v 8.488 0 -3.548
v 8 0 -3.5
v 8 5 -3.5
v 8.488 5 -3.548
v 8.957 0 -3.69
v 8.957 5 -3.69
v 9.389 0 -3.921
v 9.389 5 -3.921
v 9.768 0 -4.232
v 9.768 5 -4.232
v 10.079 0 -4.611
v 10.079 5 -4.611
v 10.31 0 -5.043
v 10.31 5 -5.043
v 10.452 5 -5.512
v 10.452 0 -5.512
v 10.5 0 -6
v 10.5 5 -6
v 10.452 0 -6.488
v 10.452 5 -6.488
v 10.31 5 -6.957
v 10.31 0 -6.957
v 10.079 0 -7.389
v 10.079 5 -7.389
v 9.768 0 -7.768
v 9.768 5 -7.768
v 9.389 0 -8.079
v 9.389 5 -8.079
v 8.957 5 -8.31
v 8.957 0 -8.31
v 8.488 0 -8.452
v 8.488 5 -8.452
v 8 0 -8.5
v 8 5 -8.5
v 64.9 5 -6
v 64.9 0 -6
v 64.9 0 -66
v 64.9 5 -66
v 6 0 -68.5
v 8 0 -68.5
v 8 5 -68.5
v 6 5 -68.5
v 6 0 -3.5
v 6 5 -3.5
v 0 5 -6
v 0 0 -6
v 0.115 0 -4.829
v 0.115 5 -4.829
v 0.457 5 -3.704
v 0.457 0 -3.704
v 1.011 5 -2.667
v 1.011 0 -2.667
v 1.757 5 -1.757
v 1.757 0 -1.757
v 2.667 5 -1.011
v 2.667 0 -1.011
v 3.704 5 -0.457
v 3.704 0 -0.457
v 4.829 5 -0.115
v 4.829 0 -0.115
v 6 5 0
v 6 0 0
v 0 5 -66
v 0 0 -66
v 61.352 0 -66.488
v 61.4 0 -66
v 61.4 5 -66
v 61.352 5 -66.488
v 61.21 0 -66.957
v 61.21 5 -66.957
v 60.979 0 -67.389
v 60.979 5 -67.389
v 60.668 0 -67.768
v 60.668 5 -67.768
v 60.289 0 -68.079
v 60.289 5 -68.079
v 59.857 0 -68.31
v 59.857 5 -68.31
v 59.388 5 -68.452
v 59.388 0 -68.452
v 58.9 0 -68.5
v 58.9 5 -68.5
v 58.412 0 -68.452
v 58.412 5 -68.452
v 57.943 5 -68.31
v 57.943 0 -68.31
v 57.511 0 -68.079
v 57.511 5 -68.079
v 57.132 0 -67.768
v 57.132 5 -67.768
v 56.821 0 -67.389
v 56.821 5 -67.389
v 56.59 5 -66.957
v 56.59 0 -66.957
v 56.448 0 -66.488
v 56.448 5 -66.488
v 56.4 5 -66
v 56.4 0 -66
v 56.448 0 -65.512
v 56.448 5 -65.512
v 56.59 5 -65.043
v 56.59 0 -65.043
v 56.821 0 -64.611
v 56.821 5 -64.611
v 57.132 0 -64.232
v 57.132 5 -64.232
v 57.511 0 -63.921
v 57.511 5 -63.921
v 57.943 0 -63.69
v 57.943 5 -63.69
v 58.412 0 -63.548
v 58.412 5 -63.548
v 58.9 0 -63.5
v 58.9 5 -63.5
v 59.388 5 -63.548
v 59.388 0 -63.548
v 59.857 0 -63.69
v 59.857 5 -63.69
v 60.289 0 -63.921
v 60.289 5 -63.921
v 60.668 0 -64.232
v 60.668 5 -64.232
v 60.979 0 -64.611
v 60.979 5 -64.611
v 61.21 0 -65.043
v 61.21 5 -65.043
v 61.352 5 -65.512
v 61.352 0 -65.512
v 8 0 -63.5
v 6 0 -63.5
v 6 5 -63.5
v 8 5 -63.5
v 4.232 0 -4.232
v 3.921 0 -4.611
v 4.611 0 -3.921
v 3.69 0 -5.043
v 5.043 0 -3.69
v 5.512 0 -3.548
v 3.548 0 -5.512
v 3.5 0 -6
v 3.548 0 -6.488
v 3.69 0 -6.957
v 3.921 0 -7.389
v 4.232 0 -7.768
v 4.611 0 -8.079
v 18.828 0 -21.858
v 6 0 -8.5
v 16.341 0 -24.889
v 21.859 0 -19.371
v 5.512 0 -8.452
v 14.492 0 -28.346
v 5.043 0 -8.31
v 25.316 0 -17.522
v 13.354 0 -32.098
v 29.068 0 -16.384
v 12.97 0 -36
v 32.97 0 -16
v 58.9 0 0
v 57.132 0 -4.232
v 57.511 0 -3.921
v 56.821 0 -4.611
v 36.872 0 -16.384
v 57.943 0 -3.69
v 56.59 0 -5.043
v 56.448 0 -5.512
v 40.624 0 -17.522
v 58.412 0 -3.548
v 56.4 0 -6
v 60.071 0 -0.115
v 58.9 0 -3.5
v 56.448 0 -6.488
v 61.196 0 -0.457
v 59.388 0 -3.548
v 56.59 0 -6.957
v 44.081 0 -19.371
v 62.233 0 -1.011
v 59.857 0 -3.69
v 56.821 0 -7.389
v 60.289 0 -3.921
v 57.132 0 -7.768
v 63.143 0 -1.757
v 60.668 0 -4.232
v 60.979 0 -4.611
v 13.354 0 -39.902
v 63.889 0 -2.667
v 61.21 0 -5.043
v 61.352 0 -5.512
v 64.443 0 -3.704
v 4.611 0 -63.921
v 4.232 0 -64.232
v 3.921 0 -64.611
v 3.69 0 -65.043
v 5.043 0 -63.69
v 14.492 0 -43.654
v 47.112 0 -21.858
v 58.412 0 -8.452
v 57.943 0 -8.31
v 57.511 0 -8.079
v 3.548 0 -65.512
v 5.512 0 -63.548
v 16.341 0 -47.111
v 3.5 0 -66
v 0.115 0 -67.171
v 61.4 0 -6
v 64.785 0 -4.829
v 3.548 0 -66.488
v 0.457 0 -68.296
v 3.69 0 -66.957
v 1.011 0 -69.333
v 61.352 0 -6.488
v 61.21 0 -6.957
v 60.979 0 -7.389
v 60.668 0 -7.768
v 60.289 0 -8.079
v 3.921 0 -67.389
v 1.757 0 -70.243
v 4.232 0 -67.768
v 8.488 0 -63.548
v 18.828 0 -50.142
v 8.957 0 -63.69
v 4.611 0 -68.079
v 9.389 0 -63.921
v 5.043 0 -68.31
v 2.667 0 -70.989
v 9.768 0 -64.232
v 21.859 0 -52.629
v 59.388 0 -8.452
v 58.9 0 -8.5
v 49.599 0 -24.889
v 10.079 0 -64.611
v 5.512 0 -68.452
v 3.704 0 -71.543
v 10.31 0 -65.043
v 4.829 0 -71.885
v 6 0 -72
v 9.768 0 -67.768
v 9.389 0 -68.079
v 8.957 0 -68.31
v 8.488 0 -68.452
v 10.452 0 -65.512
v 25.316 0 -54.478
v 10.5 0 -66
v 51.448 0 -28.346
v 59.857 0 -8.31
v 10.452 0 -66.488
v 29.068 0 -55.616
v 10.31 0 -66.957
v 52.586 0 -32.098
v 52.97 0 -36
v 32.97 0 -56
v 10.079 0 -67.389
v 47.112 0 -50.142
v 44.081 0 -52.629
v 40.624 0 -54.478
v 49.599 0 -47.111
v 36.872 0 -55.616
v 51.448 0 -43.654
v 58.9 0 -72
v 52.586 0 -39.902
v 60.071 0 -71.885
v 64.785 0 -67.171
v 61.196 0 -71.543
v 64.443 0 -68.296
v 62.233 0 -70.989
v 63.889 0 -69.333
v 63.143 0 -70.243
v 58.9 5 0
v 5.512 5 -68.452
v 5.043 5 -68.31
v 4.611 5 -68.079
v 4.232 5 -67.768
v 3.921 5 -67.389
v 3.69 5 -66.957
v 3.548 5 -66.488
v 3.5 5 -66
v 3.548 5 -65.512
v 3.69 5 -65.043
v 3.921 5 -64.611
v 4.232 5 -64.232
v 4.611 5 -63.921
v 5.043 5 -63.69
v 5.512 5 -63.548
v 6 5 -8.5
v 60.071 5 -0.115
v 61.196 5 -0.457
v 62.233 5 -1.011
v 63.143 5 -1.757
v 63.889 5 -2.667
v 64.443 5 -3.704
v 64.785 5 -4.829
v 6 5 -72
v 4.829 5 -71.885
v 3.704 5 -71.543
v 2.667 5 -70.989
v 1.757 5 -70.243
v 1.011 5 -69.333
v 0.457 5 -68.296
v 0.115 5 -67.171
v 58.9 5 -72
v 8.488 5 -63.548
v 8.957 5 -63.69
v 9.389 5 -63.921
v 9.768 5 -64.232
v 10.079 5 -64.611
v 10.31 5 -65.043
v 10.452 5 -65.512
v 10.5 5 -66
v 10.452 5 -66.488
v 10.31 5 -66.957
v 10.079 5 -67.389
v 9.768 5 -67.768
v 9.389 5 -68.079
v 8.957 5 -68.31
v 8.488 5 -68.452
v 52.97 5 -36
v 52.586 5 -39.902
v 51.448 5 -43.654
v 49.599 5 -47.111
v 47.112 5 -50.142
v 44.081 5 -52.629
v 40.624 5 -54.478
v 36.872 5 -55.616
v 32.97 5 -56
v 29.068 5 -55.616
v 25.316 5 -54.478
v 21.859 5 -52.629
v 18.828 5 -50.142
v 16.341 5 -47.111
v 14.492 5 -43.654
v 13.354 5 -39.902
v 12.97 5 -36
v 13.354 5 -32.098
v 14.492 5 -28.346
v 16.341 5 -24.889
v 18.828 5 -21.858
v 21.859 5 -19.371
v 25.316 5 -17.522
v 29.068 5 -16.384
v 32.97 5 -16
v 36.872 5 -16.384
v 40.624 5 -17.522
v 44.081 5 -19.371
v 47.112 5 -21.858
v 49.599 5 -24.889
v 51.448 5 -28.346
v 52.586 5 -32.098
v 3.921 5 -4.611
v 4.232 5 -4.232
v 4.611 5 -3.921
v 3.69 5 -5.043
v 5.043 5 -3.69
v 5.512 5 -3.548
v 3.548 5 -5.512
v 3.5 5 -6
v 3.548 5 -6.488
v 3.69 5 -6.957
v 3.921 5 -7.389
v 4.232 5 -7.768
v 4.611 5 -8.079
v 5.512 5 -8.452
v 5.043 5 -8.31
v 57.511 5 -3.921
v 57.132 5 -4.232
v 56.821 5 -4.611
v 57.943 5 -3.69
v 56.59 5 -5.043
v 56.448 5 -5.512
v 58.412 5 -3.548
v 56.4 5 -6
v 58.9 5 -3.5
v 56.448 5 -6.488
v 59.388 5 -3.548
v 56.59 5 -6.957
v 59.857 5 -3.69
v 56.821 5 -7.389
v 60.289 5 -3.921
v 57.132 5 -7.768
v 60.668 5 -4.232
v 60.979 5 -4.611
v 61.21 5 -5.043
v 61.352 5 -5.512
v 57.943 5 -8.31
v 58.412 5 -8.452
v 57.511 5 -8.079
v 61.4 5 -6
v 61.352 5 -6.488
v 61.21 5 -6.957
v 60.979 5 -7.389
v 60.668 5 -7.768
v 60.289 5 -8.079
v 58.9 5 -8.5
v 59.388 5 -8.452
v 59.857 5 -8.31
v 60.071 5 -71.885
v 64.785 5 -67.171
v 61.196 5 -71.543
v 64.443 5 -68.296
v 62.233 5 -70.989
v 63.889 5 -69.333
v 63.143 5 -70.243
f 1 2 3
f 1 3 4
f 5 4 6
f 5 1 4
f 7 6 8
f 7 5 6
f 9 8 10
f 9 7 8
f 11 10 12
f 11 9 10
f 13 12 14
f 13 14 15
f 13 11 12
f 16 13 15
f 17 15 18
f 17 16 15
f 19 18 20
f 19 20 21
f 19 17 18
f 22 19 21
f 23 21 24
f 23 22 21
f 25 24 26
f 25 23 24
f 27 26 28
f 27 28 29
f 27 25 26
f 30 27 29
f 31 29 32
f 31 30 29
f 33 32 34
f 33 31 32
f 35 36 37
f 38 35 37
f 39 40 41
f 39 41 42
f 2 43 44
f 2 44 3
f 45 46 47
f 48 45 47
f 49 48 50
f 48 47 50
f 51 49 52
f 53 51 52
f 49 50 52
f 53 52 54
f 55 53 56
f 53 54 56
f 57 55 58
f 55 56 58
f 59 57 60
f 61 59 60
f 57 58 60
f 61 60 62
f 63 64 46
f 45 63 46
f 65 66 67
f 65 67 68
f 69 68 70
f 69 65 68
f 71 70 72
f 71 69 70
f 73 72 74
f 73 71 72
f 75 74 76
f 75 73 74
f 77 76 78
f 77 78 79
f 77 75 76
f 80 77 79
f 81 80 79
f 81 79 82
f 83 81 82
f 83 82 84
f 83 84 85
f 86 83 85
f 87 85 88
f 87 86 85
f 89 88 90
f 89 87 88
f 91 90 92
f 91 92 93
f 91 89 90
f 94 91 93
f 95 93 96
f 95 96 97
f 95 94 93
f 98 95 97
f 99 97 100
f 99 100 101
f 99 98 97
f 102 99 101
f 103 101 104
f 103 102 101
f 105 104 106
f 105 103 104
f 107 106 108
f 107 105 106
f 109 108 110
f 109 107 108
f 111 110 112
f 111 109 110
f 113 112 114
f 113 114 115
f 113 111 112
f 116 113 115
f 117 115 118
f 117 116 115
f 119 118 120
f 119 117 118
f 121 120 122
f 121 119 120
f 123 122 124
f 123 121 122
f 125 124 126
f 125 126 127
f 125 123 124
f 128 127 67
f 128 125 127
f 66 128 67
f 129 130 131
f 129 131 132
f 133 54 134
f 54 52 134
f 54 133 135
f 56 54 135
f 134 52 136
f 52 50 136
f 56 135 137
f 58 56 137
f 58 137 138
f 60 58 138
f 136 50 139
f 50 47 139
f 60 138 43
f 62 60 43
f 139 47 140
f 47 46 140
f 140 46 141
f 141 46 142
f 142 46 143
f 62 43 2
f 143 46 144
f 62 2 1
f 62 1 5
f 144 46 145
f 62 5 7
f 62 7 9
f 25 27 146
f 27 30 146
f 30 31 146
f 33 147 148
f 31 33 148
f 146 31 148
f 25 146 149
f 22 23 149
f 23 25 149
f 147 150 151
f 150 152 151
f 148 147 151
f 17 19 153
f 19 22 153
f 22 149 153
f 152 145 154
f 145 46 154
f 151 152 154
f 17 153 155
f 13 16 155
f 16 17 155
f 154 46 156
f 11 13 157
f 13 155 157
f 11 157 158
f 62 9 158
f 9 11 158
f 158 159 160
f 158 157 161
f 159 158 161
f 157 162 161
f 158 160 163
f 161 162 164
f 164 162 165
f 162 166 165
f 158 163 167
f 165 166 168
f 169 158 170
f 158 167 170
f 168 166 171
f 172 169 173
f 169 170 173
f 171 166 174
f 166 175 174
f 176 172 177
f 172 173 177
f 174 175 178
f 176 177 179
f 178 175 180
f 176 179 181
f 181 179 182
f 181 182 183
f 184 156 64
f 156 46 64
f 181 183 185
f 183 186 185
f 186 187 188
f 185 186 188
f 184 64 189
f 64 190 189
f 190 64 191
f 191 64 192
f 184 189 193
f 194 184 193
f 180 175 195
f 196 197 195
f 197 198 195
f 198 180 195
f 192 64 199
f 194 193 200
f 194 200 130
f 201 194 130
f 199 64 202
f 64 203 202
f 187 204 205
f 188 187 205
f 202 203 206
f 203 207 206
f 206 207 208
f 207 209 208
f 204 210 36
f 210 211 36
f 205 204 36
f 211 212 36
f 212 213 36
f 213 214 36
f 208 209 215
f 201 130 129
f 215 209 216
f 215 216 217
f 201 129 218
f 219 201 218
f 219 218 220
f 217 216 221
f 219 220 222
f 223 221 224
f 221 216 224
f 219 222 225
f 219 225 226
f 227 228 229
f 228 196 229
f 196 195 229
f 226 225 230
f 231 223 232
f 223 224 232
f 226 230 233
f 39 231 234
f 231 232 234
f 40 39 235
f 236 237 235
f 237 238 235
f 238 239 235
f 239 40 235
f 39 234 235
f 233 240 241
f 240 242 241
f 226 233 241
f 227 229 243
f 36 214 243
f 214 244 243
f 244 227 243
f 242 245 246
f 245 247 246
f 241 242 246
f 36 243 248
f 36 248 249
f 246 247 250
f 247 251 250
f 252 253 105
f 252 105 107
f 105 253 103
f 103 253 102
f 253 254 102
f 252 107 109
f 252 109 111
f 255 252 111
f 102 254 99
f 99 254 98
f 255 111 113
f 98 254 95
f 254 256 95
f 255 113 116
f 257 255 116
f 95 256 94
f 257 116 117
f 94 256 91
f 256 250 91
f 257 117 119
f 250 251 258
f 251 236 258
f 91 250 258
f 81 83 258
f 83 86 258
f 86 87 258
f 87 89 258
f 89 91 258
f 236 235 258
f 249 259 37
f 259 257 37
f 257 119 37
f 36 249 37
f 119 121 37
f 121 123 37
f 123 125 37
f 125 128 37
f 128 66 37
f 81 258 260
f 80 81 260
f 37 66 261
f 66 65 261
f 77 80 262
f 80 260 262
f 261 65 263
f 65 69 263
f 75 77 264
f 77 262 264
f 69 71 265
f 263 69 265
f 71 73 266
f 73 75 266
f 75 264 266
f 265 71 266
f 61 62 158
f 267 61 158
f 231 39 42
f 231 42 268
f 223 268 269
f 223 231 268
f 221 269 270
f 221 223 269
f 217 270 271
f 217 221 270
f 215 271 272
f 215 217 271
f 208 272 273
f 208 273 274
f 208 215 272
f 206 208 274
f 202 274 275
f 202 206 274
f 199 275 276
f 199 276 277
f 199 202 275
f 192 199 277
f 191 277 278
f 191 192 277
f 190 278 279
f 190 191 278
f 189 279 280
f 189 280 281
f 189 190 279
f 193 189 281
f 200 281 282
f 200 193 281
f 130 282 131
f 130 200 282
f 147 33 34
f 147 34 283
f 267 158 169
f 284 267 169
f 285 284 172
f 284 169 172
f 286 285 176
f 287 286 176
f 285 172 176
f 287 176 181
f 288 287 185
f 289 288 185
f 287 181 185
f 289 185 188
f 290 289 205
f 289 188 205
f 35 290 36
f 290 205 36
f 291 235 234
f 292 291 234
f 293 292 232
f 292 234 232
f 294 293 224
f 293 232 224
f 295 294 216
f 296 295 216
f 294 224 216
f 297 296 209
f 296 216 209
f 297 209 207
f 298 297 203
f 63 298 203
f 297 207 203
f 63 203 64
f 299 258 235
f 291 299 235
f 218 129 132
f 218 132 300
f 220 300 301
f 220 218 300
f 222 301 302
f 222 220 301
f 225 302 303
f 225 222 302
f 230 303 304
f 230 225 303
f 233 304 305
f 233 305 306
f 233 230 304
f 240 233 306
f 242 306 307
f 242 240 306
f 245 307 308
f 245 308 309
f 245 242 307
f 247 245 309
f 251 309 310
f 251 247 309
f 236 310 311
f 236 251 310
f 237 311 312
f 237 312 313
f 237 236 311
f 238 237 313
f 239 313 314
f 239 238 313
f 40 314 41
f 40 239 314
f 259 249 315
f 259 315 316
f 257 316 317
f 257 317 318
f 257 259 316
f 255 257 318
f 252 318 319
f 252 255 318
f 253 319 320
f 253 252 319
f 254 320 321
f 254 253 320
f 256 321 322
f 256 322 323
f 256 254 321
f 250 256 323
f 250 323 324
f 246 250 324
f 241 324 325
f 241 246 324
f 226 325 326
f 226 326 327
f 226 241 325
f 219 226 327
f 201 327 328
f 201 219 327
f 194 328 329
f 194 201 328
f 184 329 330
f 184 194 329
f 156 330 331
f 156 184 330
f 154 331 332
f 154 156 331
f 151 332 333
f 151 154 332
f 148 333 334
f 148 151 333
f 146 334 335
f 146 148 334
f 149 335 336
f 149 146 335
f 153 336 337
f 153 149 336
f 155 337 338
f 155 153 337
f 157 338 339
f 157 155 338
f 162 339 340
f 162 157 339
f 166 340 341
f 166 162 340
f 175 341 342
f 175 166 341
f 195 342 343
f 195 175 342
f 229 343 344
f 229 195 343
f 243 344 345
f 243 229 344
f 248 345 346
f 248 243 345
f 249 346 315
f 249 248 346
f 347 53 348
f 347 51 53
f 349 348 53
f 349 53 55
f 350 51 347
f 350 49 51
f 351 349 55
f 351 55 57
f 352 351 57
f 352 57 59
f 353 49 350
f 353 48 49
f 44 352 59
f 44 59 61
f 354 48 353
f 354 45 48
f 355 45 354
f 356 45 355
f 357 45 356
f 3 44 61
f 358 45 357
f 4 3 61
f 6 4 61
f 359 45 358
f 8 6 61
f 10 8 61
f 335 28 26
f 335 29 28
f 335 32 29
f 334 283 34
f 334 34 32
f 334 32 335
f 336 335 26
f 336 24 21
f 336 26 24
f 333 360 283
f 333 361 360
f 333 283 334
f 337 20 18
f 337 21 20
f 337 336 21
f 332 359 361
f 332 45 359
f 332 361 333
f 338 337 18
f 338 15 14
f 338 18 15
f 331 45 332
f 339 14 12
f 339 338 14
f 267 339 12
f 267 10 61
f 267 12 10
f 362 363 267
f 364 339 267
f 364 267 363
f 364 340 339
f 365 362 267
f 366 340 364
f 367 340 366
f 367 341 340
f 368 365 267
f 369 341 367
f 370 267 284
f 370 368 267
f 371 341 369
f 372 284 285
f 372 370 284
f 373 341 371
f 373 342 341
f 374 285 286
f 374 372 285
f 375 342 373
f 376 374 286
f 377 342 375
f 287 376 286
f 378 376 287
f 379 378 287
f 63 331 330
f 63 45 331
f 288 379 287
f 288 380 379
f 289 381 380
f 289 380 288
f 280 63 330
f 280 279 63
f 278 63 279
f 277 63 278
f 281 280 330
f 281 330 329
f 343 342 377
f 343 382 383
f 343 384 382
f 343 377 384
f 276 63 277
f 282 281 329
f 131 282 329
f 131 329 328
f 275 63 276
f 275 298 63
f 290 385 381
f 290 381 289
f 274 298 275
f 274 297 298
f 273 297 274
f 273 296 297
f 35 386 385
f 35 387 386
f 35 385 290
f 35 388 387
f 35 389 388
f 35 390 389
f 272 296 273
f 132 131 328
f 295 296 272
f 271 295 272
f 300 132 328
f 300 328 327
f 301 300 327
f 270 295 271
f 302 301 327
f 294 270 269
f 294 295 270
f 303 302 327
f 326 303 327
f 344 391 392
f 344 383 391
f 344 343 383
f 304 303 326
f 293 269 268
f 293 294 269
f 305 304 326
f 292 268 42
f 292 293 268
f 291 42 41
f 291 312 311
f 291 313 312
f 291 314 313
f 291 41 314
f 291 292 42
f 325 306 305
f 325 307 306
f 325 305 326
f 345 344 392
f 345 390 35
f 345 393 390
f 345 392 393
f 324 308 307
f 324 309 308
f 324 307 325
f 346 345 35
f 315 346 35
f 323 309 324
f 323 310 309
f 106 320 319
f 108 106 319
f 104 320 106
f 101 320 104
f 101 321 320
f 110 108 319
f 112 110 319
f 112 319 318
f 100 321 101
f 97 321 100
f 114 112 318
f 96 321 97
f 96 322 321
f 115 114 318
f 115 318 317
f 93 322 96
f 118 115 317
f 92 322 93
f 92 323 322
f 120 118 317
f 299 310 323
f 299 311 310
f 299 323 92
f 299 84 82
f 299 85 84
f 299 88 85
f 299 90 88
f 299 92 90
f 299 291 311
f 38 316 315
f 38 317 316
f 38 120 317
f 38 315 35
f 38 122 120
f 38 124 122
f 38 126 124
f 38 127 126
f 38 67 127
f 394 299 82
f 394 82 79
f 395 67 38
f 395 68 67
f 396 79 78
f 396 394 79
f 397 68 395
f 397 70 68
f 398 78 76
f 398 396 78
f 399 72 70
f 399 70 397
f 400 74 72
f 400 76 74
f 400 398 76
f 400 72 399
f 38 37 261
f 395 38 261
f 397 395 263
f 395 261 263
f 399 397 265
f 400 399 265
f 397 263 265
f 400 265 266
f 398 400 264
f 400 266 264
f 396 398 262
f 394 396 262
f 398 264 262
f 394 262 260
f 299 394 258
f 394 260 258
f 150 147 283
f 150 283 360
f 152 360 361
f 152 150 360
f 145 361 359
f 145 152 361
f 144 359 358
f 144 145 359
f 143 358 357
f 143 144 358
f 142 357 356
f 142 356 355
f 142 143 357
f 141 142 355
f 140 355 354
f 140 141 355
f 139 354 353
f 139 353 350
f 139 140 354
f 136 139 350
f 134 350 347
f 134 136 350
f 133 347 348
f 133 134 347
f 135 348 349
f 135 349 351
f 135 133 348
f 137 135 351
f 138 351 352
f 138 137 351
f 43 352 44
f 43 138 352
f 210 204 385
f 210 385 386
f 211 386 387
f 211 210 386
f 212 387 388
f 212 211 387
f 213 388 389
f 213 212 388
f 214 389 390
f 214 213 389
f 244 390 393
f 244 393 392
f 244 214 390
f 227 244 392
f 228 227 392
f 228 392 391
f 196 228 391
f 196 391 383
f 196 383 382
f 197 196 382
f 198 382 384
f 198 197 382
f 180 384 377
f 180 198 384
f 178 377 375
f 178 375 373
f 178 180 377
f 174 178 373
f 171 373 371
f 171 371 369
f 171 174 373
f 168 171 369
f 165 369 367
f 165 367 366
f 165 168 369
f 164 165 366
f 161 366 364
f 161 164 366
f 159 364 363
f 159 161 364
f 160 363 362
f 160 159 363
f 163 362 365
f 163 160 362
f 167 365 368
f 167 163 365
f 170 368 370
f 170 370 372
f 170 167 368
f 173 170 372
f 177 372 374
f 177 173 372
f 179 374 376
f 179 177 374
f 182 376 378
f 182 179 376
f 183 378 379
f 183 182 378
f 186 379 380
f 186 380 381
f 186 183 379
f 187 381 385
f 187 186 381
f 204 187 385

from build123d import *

# Parameters (mm, degrees)
SKETCH1_R           = 2.5
SKETCH1_R_2         = 20
BOSS_EXTRUDE1_DEPTH = 5


with BuildPart() as part:
    # Sketch1 → Boss-Extrude1 (new body)
    with BuildSketch(Plane(origin=(0, 0, 0), x_dir=(1, 0, 0), z_dir=(0, 1, 0))):
        with BuildLine():
            Line((6, 0), (58.9, 0))
            ThreePointArc((58.9, 0), (63.142640687, 1.757359313), (64.9, 6))
            Line((64.9, 6), (64.9, 66))
            ThreePointArc((64.9, 66), (63.142640687, 70.242640687), (58.9, 72))
            Line((58.9, 72), (6, 72))
            ThreePointArc((6, 72), (1.757359313, 70.242640687), (0, 66))
            Line((0, 66), (0, 6))
            ThreePointArc((0, 6), (1.757359313, 1.757359313), (6, 0))
        make_face()
        with Locations((58.9, 66)):
            Circle(SKETCH1_R, mode=Mode.SUBTRACT)
        with Locations((58.9, 6)):
            Circle(SKETCH1_R, mode=Mode.SUBTRACT)
        with Locations((32.97, 36)):
            Circle(SKETCH1_R_2, mode=Mode.SUBTRACT)
        with BuildLine():
            Line((6, 3.5), (8, 3.5))
            ThreePointArc((8, 3.5), (10.5, 6), (8, 8.5))
            Line((8, 8.5), (6, 8.5))
            ThreePointArc((6, 8.5), (3.5, 6), (6, 3.5))
        make_face(mode=Mode.SUBTRACT)
        with BuildLine():
            Line((6, 63.5), (8, 63.5))
            ThreePointArc((8, 63.5), (10.5, 66), (8, 68.5))
            Line((8, 68.5), (6, 68.5))
            ThreePointArc((6, 68.5), (3.5, 66), (6, 63.5))
        make_face(mode=Mode.SUBTRACT)
    extrude(amount=BOSS_EXTRUDE1_DEPTH)


solid = part.part
